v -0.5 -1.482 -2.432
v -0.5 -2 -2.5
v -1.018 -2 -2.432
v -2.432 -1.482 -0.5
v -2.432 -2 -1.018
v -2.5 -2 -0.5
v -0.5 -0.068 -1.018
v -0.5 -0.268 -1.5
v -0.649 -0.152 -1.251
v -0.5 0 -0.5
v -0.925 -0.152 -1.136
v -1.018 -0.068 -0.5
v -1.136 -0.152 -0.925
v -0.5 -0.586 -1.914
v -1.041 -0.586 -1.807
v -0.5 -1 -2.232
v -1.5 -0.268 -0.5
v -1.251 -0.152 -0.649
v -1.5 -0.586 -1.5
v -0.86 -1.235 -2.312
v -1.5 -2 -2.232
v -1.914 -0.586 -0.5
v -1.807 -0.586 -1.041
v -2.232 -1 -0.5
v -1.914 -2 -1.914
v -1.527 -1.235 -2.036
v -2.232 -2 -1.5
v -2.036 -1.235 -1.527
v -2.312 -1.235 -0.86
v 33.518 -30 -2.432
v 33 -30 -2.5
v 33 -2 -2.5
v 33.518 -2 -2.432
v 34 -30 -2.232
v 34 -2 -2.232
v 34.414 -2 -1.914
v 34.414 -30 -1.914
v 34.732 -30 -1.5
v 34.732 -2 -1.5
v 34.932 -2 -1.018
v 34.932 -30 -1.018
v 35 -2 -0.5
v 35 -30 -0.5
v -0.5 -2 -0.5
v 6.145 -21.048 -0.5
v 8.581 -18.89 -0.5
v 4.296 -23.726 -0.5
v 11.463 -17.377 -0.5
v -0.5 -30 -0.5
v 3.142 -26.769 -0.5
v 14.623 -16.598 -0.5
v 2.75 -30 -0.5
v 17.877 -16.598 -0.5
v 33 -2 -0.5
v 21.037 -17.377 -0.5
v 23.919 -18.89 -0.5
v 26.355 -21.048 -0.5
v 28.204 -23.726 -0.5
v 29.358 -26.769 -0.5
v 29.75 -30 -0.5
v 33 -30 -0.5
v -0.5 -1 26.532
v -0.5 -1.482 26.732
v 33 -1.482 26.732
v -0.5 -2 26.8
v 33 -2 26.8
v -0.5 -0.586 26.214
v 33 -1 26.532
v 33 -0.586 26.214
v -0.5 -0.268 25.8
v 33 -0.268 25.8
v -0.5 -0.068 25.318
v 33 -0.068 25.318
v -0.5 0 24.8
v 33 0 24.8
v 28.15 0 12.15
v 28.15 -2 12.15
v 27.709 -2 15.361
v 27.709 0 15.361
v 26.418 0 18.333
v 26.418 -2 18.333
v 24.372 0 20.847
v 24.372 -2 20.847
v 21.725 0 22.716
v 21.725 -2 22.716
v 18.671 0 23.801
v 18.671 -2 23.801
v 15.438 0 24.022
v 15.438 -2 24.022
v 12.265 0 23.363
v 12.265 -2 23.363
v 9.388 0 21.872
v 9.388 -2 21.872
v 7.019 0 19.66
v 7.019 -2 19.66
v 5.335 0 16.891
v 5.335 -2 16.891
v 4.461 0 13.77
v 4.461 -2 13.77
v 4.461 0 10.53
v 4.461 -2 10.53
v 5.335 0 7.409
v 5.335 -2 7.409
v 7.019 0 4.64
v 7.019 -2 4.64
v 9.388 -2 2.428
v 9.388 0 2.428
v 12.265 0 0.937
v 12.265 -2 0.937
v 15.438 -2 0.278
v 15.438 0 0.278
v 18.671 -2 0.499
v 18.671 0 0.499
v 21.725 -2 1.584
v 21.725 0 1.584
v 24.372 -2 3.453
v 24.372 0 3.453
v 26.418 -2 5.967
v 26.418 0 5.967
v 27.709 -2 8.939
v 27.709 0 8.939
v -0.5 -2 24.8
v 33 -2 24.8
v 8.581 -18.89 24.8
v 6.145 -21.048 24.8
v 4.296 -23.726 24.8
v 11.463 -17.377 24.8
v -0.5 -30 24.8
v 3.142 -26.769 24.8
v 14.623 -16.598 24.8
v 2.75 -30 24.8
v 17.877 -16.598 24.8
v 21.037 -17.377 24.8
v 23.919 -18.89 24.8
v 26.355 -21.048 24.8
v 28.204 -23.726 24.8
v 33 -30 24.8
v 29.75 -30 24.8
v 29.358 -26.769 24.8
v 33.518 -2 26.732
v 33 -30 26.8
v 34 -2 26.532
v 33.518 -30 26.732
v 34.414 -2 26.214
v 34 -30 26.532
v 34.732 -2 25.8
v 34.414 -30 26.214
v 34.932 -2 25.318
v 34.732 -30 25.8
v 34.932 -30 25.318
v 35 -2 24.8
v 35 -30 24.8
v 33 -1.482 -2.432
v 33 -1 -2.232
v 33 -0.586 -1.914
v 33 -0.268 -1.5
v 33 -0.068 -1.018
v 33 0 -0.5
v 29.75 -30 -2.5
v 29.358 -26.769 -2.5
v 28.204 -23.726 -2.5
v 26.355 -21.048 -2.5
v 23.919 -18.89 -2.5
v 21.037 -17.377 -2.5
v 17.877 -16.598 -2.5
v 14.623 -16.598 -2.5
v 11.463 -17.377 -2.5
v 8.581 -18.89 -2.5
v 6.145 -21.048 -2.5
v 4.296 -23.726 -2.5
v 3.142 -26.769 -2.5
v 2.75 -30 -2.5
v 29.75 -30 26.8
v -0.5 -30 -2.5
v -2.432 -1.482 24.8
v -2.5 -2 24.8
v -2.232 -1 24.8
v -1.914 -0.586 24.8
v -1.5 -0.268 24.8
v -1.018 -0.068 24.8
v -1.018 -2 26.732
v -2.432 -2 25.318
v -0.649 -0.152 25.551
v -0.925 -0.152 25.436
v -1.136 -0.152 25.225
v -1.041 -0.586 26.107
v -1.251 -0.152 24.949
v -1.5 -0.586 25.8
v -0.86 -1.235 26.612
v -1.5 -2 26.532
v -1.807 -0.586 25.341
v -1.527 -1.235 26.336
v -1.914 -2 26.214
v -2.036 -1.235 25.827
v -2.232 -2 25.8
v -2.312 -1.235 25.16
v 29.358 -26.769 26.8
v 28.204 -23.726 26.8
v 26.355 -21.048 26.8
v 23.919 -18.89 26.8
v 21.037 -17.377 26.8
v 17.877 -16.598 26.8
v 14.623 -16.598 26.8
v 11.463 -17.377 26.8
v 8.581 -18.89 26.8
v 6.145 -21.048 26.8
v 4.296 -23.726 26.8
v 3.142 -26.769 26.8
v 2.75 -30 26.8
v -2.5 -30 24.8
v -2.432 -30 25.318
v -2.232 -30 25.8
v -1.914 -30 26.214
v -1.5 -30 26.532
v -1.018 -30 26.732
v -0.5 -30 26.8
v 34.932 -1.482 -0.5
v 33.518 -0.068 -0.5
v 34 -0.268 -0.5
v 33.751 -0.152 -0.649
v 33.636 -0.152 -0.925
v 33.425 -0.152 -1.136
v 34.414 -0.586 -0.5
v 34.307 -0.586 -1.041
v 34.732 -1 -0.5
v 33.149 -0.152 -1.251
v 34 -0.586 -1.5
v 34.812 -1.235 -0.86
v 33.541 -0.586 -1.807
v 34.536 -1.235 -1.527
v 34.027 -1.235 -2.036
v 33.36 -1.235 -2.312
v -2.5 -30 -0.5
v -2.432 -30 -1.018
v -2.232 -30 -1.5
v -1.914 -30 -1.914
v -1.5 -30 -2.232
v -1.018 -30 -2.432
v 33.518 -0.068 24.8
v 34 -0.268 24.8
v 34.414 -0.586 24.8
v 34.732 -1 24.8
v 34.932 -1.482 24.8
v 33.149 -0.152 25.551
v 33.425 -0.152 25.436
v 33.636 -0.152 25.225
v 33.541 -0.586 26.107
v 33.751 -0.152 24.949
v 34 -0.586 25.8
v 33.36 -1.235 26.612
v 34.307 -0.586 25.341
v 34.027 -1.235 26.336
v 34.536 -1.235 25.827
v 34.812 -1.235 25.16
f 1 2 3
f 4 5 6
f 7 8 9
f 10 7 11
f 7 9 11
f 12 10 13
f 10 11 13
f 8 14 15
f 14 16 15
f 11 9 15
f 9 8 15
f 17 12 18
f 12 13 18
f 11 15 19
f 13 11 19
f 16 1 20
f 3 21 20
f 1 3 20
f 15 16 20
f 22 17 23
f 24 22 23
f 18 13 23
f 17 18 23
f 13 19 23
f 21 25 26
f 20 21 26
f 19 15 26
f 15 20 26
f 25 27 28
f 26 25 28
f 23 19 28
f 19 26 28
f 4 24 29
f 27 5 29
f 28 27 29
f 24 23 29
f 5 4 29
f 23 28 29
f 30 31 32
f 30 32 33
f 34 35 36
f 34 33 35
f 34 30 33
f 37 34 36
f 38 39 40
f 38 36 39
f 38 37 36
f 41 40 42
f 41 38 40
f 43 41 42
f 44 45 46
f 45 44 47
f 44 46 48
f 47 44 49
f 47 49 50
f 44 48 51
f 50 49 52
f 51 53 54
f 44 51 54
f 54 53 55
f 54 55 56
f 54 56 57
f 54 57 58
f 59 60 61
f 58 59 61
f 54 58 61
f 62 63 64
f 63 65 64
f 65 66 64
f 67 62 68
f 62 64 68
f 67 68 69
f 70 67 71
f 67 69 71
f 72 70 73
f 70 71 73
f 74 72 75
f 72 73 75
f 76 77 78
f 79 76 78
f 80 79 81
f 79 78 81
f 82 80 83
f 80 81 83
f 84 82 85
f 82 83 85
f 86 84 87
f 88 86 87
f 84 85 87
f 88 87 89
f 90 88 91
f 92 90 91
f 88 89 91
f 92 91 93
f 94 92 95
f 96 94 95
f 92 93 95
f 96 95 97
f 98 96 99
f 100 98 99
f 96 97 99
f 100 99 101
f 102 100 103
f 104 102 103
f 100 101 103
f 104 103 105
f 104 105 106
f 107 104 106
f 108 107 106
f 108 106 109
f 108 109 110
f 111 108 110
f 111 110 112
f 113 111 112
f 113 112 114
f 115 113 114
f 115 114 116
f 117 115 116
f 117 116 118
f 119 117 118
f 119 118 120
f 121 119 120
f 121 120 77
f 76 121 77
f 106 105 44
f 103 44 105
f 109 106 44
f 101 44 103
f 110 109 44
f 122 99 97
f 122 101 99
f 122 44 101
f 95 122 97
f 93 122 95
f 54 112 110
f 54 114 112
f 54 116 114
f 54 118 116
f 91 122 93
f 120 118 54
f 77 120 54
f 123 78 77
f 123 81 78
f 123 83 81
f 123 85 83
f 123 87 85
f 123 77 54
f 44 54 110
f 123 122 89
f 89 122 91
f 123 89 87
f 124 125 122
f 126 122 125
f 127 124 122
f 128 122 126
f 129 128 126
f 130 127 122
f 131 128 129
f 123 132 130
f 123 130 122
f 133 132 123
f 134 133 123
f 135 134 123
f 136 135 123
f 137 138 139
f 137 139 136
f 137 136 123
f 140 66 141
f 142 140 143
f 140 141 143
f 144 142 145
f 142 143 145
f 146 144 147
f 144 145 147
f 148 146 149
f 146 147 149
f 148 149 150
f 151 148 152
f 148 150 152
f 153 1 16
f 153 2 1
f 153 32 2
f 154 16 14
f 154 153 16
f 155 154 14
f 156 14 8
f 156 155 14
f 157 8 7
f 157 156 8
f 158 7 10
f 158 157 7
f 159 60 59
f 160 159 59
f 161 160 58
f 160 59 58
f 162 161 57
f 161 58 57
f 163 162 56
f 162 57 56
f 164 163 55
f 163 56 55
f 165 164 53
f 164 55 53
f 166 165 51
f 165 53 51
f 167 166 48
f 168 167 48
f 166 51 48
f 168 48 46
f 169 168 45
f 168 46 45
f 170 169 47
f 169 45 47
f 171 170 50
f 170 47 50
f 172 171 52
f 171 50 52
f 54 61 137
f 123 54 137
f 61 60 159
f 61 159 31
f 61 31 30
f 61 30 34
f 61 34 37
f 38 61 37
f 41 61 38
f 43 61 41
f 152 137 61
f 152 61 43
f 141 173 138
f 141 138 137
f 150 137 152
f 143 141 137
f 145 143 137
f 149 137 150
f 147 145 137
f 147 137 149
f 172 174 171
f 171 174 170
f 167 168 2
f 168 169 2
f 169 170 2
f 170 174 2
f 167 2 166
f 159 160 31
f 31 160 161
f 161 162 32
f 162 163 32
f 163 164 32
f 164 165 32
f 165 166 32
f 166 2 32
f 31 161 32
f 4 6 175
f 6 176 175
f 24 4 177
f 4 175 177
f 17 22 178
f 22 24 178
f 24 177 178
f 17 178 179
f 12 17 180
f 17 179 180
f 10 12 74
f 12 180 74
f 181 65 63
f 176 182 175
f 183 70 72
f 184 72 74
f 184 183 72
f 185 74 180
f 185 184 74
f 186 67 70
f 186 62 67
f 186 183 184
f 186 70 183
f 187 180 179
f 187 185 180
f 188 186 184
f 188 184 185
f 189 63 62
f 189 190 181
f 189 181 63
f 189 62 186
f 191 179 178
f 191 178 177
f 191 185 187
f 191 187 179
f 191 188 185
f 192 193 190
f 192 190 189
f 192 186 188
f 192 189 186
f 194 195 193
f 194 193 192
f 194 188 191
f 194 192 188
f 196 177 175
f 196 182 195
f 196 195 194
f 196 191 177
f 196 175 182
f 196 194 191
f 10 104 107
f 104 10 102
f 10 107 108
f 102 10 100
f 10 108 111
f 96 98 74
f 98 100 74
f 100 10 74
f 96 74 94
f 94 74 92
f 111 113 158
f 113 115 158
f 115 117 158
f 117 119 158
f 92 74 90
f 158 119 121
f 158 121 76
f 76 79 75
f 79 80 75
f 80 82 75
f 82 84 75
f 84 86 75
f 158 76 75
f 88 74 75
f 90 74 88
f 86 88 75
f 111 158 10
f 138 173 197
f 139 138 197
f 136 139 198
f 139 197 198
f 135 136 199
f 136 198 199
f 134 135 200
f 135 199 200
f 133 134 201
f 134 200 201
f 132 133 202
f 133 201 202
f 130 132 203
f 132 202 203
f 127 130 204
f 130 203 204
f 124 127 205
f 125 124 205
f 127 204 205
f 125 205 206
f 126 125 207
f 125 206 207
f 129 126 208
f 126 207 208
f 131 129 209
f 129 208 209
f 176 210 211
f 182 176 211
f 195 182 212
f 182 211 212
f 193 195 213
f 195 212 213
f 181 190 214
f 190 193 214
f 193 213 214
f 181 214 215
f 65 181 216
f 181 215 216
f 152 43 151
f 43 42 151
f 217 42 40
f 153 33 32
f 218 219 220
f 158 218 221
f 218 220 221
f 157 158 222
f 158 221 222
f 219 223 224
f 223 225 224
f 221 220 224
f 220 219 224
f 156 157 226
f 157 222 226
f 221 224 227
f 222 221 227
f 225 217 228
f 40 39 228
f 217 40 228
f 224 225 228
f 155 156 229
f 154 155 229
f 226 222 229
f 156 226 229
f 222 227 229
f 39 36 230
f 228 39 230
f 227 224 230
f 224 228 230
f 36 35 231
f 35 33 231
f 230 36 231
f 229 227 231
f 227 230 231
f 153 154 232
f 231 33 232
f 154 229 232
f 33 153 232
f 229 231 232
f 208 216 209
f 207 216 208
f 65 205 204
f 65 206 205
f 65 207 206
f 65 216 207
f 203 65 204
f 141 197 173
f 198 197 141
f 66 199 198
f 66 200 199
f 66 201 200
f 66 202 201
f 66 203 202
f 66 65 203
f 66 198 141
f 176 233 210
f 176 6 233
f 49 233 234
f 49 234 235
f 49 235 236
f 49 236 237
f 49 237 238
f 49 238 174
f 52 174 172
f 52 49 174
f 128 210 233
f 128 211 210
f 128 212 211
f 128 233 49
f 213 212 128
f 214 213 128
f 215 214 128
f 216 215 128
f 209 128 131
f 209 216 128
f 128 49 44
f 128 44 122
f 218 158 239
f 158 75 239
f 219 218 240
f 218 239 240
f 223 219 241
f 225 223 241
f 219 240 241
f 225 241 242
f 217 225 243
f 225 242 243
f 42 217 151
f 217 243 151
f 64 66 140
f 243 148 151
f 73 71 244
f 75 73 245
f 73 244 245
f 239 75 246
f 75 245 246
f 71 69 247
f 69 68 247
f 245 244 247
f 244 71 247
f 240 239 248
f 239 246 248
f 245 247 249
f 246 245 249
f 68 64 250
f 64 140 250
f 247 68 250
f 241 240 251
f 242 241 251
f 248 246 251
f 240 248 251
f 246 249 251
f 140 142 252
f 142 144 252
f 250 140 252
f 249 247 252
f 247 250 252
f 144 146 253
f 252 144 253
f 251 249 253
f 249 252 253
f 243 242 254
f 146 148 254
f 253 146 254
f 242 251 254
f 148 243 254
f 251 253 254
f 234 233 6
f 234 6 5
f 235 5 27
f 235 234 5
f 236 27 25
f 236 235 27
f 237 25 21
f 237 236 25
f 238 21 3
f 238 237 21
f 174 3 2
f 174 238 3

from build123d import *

# Parameters (mm, degrees)
F0_W     = 37.5
F0_H     = 29.3
F1_DEPTH = 30
F2_W     = 33.5
F2_H     = 25.3
F3_DEPTH = 28
F4_R     = 11.9
F5_DEPTH = 2.001
F7_DEPTH = 29.301
F8_R     = 2


with BuildPart() as f1:
    # F0 (on Front) → F1 (new body)
    with BuildSketch(Plane.XZ):
        with Locations((16.25, 12.15)):
            Rectangle(F0_W, F0_H)
    extrude(amount=F1_DEPTH)

    # F2 (on face) → F3 (cut)
    with BuildSketch(Plane.XZ.offset(30)):
        with Locations((16.25, 12.15)):
            Rectangle(F2_W, F2_H)
    extrude(amount=-F3_DEPTH, mode=Mode.SUBTRACT)

    # F4 (on face) → F5 (cut, through all)
    with BuildSketch(Plane.XZ.offset(2)):
        with Locations((16.25, 12.15)):
            Circle(F4_R)
    extrude(amount=-F5_DEPTH, mode=Mode.SUBTRACT)

    # F6 (on face) → F7 (cut, through all)
    with BuildSketch(Plane.XY.offset(26.8)):
        with BuildLine():
            Line((2.75, -30), (29.75, -30))
            ThreePointArc((29.75, -30), (16.25, -16.5), (2.75, -30))
        make_face()
    extrude(amount=-F7_DEPTH, mode=Mode.SUBTRACT)

    # F8
    f8_edges = [f1.edges().sort_by_distance(p)[0] for p in [
        (-2.5, -15, 26.8),
        (-2.5, -15, -2.5),
        (35, -15, -2.5),
        (35, -15, 26.8),
        (16.25, 0, 26.8),
        (35, 0, 12.15),
        (16.25, 0, -2.5),
        (-2.5, 0, 12.15),
    ]]
    fillet(f8_edges, radius=F8_R)


solid = f1.part
